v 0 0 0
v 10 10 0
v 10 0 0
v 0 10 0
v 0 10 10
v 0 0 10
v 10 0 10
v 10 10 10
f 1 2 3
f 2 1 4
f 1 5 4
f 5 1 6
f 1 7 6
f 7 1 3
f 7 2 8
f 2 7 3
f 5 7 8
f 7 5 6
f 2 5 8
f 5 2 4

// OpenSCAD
// model33: nested scopes and variable shadowing
// Test that variables defined inside a module body don't leak to outer scope
x = 10;

module test() {
    y = 5;
    cube(y);
}

test();
// x should still be 10 here, and y should not be visible
cube(x);
